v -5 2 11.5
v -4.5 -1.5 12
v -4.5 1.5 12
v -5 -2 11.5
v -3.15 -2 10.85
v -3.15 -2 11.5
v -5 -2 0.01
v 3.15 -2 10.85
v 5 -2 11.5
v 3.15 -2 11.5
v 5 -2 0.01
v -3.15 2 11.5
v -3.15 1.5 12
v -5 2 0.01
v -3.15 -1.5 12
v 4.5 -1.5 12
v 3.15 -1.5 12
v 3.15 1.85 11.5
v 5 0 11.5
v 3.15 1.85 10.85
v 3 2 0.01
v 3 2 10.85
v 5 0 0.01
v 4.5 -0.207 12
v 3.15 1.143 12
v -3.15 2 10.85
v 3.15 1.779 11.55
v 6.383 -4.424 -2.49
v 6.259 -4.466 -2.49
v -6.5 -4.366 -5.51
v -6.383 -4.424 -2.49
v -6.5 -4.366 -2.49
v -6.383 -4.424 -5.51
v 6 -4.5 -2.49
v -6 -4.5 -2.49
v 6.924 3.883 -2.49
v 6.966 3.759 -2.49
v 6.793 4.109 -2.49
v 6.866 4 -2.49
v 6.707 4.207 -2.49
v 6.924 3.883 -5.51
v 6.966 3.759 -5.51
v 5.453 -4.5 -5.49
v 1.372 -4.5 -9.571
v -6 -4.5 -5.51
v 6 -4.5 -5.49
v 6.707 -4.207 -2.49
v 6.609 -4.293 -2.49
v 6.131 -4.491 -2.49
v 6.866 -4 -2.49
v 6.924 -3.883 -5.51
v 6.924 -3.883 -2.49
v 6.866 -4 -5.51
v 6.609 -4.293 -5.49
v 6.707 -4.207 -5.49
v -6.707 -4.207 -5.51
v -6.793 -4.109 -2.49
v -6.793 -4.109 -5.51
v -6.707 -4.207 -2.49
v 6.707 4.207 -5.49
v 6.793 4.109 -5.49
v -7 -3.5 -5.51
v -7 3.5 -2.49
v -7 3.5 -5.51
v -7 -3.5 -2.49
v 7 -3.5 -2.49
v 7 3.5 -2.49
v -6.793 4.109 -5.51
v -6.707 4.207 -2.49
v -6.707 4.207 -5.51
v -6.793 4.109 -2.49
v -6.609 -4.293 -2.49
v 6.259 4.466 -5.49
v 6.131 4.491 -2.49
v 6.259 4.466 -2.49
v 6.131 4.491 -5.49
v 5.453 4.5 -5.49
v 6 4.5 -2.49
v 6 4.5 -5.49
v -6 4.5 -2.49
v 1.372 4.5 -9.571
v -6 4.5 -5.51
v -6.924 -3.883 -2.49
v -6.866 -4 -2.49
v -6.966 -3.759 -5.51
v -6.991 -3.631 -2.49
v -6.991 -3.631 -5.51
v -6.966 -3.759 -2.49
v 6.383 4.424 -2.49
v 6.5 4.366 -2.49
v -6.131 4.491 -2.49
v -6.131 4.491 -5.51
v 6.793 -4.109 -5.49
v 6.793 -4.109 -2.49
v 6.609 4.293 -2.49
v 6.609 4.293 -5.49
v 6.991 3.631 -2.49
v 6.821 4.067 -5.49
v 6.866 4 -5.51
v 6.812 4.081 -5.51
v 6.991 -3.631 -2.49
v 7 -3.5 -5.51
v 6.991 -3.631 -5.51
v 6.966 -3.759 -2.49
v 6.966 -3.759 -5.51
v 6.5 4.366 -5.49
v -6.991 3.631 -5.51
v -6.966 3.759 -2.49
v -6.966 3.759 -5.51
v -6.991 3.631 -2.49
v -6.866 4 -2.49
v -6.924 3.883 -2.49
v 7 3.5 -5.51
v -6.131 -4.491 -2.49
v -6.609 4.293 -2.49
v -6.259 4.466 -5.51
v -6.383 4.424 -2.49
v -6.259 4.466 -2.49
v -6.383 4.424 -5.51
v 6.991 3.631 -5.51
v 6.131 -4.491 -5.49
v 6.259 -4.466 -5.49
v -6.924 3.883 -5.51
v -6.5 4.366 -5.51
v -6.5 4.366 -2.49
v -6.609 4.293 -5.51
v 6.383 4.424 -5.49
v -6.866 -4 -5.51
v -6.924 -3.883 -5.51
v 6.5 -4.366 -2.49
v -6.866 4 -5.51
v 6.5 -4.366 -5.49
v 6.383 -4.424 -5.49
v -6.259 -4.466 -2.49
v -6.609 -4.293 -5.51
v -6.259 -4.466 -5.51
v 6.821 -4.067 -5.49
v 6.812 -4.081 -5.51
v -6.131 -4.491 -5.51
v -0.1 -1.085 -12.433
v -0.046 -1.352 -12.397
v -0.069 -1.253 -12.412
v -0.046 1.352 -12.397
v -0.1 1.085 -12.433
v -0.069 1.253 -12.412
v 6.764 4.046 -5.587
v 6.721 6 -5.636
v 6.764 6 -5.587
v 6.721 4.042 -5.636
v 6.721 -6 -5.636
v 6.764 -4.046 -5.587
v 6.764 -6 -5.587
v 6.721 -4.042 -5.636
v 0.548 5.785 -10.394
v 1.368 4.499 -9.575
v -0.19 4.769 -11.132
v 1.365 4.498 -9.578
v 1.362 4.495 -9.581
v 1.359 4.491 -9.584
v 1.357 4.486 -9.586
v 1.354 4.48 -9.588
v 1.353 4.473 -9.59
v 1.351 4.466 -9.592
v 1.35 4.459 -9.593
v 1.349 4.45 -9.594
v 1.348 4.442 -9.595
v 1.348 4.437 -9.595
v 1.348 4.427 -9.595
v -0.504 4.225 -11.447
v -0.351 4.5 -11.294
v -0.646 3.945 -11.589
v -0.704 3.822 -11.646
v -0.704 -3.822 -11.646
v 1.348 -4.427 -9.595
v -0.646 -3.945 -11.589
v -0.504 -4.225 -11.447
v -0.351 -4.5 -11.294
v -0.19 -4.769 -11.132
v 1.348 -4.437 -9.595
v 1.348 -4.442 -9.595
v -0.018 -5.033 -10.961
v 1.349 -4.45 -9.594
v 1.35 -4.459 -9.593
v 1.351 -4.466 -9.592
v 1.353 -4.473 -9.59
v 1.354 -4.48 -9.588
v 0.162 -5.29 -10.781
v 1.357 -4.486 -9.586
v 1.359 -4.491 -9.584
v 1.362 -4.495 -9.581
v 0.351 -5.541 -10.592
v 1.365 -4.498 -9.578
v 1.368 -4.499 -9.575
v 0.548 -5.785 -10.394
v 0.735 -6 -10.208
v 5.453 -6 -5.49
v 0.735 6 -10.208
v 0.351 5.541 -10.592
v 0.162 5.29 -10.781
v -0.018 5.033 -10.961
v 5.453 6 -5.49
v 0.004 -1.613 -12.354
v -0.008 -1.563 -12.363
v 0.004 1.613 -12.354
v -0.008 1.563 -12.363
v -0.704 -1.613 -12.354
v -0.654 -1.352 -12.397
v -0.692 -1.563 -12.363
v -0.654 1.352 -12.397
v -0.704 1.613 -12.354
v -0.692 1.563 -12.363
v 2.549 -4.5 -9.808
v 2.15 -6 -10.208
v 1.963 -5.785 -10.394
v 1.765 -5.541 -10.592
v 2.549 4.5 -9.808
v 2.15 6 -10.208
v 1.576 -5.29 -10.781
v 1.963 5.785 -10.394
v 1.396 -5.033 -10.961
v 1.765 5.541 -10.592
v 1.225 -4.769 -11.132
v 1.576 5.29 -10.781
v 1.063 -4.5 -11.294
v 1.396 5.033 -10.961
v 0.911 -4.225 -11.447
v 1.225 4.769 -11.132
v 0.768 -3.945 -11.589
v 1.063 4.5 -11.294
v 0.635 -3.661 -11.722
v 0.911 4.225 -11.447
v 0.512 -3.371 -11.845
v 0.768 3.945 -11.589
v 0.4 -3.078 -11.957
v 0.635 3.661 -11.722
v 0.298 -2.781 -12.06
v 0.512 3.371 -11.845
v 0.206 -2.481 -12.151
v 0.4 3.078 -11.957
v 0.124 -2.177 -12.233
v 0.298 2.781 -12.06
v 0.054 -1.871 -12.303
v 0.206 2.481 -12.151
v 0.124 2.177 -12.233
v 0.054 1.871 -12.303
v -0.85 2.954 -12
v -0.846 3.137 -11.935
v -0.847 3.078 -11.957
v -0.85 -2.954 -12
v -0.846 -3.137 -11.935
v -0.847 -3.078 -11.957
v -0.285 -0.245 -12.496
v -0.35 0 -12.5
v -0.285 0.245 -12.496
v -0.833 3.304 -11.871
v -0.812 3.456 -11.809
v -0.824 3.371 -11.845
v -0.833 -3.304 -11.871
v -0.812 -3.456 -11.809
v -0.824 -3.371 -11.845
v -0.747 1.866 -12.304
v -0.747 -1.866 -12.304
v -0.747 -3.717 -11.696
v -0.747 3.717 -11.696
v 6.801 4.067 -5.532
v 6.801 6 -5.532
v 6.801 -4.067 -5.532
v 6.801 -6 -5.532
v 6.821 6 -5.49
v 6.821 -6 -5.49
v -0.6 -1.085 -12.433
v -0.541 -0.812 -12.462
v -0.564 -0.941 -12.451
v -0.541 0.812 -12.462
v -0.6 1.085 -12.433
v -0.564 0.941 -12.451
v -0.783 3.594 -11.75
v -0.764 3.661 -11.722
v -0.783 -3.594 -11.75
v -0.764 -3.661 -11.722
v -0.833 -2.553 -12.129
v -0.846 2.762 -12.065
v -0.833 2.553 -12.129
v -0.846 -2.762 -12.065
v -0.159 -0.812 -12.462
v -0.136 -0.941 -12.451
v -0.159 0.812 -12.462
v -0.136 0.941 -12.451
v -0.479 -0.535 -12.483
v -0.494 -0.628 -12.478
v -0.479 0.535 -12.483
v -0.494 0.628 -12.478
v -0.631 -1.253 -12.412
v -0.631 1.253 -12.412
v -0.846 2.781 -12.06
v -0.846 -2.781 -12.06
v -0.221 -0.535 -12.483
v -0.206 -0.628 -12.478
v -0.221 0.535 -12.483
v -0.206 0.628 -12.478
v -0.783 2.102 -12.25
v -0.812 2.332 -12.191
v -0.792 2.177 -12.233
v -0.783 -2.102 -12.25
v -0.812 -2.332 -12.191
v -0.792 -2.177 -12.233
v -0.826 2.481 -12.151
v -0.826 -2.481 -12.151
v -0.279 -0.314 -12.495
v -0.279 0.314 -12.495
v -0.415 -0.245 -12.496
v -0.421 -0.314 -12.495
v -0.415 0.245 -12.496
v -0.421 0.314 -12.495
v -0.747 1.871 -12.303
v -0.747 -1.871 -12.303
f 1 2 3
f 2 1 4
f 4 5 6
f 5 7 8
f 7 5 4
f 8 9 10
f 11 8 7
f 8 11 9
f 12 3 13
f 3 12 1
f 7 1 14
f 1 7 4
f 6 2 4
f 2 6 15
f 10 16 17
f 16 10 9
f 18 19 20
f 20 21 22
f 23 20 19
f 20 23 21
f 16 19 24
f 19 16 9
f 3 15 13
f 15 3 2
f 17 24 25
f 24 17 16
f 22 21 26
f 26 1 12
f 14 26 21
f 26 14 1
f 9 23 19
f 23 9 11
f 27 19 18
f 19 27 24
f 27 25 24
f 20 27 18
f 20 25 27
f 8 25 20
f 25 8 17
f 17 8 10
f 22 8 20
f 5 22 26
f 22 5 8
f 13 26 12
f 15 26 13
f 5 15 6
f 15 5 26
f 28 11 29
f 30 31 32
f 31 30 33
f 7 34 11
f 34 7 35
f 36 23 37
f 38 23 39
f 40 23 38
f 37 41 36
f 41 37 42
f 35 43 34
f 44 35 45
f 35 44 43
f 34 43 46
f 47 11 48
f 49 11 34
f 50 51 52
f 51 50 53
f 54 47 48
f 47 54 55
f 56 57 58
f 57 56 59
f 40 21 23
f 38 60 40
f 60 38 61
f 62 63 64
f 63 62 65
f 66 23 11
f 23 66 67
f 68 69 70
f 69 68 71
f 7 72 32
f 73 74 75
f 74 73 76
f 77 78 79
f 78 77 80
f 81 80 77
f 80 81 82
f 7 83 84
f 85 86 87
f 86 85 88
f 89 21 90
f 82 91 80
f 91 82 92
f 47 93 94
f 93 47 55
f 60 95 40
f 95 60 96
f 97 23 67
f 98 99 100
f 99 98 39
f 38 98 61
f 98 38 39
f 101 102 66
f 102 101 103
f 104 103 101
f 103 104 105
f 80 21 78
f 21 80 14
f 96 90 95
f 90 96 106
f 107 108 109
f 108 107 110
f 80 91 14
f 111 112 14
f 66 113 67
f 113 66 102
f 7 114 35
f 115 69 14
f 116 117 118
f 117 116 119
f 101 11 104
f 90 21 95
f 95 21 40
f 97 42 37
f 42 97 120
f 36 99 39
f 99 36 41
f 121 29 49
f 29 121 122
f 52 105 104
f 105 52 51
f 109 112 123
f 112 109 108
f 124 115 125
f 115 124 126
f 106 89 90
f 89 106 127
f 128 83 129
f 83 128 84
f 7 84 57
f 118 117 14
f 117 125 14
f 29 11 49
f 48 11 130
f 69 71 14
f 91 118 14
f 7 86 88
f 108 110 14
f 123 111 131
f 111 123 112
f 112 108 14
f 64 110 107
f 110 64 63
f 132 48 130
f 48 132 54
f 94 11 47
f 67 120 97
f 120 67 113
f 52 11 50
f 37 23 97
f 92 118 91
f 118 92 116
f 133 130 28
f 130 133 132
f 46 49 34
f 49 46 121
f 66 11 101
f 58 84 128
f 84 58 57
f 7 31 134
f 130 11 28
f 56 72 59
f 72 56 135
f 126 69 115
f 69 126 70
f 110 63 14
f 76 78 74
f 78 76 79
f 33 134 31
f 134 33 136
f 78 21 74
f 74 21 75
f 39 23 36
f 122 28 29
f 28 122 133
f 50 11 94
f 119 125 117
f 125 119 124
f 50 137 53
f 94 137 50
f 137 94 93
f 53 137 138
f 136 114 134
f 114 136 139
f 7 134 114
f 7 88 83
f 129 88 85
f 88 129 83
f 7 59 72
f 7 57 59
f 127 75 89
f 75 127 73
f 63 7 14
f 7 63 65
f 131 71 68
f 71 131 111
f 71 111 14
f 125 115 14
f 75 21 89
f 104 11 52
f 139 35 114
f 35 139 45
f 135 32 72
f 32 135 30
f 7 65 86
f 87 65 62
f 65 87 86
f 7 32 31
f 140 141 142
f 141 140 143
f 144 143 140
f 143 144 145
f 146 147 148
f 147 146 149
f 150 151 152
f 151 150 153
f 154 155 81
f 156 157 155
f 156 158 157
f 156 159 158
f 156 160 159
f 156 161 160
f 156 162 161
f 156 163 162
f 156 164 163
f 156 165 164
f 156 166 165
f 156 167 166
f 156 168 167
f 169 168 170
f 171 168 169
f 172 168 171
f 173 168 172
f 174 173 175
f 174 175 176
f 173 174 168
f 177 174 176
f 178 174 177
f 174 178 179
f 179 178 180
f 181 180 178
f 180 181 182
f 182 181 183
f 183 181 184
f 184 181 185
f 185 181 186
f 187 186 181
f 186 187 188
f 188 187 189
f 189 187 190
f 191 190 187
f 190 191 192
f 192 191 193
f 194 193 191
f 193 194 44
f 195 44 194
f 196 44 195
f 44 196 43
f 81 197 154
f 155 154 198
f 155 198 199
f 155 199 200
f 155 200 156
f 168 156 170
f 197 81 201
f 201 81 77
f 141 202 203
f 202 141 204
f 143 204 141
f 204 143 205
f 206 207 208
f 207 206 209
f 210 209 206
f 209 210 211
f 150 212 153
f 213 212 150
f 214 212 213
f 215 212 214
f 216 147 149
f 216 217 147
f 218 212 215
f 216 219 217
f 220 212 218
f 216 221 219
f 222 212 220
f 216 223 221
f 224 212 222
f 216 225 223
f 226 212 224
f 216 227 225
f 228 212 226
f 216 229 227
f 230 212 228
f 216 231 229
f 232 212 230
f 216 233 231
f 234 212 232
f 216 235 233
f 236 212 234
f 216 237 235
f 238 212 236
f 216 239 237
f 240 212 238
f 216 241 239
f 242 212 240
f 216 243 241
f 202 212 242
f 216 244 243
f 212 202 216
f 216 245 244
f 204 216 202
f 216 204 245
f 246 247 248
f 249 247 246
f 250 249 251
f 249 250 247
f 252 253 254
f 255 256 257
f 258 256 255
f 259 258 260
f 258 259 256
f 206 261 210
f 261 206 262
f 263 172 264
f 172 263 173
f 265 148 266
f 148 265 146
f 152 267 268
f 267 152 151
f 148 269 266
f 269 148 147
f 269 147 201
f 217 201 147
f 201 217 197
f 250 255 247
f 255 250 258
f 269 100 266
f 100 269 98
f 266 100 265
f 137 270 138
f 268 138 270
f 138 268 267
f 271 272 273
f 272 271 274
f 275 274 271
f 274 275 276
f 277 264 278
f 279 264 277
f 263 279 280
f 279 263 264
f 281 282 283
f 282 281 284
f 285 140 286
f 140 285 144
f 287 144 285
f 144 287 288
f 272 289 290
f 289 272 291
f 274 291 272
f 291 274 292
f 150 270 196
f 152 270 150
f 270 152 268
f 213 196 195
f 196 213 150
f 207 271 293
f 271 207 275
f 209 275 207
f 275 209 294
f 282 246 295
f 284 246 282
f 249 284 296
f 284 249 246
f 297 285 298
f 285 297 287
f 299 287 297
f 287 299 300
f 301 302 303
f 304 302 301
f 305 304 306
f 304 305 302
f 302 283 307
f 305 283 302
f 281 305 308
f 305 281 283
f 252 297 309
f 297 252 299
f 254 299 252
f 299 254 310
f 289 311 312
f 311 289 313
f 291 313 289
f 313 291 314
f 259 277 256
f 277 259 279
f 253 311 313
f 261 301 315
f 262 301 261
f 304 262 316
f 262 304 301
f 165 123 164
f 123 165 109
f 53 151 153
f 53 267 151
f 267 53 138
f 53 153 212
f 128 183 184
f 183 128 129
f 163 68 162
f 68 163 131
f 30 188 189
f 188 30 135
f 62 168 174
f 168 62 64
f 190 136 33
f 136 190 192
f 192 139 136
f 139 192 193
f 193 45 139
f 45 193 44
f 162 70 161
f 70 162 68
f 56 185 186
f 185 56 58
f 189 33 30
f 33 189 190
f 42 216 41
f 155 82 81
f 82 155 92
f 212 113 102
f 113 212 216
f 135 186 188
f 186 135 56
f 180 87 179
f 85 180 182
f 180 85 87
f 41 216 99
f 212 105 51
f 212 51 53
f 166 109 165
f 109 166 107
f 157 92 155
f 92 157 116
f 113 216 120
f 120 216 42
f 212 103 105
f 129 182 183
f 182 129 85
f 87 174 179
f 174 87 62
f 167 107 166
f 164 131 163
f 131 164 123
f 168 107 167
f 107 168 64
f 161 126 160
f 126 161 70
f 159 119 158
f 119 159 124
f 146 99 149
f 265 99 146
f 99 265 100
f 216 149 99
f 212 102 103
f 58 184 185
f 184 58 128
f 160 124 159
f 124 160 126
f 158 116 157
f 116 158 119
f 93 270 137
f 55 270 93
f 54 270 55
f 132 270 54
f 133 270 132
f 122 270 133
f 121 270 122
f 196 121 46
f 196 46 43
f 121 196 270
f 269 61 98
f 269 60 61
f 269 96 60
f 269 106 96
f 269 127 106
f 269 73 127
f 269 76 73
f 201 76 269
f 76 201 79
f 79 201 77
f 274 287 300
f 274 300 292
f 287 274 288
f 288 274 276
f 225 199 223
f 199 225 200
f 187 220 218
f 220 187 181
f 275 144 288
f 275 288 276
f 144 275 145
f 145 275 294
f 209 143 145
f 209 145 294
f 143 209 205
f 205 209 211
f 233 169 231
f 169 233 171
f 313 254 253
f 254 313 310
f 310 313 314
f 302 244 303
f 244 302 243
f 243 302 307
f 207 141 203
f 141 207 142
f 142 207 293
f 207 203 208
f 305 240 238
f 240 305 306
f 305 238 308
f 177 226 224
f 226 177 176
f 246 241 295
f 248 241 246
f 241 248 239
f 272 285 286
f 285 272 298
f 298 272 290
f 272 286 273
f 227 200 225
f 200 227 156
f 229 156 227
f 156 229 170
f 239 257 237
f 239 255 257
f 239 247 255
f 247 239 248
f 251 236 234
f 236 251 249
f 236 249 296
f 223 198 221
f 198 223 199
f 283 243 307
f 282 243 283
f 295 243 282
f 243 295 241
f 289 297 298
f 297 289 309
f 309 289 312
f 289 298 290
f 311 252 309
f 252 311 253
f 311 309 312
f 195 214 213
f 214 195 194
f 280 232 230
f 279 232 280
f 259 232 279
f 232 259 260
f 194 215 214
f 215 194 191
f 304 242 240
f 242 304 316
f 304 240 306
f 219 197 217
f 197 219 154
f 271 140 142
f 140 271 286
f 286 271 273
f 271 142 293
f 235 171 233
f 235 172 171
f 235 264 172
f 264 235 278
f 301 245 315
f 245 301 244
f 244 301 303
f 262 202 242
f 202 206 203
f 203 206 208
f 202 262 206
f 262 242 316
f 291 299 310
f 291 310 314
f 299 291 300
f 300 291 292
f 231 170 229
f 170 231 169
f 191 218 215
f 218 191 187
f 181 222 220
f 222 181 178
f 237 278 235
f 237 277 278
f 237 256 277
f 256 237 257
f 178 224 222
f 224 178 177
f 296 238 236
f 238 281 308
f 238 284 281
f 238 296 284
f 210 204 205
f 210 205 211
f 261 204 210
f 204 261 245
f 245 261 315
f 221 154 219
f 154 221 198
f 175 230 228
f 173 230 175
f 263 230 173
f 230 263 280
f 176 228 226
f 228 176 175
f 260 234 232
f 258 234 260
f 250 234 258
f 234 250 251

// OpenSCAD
// =====================================================================
//  tip_B45_12.scad — SP1 tip B45-12: as B45 but 12 mm wide edge (width variable)
//  PROJECT SCRATCH · 05-engineering/cad/tips · units: mm
//  The 12 mm plate is wider than the 9 mm shoulder band; the pulp lump stays
//  9 mm wide, so the outer 1.5 mm of each plate end is a free 1 mm plate.
//  Round those ends to R 1.5 in plan after printing.  Crown R 9 raises the
//  edge ends 2.3 mm (0.94 mm on the 8 mm tips), so the loaded edge grows with
//  force.  The plate ends are clipped at the band plane (tm1_nail_blade) so the
//  TPU seam sleeve seats.  Loaded sense +X. Print as tip_B45 (on its side).
// =====================================================================
include <tm1_tang_lib.scad>
$fn = TM1_FN;

BLADE_W    = 12.0;
BLADE_R    = 0.5;
ATTACK     = 45;
DROP       = 7.0;
BLADE_MODE = "printed";   // "printed" | "slot"
CROSS_HOLE = false;

module tip_B45_12(w = BLADE_W, r = BLADE_R, attack = ATTACK, drop = DROP,
                  mode = BLADE_MODE, cross_hole = CROSS_HOLE) {
    tm1_tip_base(cross_hole);
    tm1_nail_blade(w = w, r = r, attack = attack, drop = drop, mode = mode);
}

tip_B45_12();
